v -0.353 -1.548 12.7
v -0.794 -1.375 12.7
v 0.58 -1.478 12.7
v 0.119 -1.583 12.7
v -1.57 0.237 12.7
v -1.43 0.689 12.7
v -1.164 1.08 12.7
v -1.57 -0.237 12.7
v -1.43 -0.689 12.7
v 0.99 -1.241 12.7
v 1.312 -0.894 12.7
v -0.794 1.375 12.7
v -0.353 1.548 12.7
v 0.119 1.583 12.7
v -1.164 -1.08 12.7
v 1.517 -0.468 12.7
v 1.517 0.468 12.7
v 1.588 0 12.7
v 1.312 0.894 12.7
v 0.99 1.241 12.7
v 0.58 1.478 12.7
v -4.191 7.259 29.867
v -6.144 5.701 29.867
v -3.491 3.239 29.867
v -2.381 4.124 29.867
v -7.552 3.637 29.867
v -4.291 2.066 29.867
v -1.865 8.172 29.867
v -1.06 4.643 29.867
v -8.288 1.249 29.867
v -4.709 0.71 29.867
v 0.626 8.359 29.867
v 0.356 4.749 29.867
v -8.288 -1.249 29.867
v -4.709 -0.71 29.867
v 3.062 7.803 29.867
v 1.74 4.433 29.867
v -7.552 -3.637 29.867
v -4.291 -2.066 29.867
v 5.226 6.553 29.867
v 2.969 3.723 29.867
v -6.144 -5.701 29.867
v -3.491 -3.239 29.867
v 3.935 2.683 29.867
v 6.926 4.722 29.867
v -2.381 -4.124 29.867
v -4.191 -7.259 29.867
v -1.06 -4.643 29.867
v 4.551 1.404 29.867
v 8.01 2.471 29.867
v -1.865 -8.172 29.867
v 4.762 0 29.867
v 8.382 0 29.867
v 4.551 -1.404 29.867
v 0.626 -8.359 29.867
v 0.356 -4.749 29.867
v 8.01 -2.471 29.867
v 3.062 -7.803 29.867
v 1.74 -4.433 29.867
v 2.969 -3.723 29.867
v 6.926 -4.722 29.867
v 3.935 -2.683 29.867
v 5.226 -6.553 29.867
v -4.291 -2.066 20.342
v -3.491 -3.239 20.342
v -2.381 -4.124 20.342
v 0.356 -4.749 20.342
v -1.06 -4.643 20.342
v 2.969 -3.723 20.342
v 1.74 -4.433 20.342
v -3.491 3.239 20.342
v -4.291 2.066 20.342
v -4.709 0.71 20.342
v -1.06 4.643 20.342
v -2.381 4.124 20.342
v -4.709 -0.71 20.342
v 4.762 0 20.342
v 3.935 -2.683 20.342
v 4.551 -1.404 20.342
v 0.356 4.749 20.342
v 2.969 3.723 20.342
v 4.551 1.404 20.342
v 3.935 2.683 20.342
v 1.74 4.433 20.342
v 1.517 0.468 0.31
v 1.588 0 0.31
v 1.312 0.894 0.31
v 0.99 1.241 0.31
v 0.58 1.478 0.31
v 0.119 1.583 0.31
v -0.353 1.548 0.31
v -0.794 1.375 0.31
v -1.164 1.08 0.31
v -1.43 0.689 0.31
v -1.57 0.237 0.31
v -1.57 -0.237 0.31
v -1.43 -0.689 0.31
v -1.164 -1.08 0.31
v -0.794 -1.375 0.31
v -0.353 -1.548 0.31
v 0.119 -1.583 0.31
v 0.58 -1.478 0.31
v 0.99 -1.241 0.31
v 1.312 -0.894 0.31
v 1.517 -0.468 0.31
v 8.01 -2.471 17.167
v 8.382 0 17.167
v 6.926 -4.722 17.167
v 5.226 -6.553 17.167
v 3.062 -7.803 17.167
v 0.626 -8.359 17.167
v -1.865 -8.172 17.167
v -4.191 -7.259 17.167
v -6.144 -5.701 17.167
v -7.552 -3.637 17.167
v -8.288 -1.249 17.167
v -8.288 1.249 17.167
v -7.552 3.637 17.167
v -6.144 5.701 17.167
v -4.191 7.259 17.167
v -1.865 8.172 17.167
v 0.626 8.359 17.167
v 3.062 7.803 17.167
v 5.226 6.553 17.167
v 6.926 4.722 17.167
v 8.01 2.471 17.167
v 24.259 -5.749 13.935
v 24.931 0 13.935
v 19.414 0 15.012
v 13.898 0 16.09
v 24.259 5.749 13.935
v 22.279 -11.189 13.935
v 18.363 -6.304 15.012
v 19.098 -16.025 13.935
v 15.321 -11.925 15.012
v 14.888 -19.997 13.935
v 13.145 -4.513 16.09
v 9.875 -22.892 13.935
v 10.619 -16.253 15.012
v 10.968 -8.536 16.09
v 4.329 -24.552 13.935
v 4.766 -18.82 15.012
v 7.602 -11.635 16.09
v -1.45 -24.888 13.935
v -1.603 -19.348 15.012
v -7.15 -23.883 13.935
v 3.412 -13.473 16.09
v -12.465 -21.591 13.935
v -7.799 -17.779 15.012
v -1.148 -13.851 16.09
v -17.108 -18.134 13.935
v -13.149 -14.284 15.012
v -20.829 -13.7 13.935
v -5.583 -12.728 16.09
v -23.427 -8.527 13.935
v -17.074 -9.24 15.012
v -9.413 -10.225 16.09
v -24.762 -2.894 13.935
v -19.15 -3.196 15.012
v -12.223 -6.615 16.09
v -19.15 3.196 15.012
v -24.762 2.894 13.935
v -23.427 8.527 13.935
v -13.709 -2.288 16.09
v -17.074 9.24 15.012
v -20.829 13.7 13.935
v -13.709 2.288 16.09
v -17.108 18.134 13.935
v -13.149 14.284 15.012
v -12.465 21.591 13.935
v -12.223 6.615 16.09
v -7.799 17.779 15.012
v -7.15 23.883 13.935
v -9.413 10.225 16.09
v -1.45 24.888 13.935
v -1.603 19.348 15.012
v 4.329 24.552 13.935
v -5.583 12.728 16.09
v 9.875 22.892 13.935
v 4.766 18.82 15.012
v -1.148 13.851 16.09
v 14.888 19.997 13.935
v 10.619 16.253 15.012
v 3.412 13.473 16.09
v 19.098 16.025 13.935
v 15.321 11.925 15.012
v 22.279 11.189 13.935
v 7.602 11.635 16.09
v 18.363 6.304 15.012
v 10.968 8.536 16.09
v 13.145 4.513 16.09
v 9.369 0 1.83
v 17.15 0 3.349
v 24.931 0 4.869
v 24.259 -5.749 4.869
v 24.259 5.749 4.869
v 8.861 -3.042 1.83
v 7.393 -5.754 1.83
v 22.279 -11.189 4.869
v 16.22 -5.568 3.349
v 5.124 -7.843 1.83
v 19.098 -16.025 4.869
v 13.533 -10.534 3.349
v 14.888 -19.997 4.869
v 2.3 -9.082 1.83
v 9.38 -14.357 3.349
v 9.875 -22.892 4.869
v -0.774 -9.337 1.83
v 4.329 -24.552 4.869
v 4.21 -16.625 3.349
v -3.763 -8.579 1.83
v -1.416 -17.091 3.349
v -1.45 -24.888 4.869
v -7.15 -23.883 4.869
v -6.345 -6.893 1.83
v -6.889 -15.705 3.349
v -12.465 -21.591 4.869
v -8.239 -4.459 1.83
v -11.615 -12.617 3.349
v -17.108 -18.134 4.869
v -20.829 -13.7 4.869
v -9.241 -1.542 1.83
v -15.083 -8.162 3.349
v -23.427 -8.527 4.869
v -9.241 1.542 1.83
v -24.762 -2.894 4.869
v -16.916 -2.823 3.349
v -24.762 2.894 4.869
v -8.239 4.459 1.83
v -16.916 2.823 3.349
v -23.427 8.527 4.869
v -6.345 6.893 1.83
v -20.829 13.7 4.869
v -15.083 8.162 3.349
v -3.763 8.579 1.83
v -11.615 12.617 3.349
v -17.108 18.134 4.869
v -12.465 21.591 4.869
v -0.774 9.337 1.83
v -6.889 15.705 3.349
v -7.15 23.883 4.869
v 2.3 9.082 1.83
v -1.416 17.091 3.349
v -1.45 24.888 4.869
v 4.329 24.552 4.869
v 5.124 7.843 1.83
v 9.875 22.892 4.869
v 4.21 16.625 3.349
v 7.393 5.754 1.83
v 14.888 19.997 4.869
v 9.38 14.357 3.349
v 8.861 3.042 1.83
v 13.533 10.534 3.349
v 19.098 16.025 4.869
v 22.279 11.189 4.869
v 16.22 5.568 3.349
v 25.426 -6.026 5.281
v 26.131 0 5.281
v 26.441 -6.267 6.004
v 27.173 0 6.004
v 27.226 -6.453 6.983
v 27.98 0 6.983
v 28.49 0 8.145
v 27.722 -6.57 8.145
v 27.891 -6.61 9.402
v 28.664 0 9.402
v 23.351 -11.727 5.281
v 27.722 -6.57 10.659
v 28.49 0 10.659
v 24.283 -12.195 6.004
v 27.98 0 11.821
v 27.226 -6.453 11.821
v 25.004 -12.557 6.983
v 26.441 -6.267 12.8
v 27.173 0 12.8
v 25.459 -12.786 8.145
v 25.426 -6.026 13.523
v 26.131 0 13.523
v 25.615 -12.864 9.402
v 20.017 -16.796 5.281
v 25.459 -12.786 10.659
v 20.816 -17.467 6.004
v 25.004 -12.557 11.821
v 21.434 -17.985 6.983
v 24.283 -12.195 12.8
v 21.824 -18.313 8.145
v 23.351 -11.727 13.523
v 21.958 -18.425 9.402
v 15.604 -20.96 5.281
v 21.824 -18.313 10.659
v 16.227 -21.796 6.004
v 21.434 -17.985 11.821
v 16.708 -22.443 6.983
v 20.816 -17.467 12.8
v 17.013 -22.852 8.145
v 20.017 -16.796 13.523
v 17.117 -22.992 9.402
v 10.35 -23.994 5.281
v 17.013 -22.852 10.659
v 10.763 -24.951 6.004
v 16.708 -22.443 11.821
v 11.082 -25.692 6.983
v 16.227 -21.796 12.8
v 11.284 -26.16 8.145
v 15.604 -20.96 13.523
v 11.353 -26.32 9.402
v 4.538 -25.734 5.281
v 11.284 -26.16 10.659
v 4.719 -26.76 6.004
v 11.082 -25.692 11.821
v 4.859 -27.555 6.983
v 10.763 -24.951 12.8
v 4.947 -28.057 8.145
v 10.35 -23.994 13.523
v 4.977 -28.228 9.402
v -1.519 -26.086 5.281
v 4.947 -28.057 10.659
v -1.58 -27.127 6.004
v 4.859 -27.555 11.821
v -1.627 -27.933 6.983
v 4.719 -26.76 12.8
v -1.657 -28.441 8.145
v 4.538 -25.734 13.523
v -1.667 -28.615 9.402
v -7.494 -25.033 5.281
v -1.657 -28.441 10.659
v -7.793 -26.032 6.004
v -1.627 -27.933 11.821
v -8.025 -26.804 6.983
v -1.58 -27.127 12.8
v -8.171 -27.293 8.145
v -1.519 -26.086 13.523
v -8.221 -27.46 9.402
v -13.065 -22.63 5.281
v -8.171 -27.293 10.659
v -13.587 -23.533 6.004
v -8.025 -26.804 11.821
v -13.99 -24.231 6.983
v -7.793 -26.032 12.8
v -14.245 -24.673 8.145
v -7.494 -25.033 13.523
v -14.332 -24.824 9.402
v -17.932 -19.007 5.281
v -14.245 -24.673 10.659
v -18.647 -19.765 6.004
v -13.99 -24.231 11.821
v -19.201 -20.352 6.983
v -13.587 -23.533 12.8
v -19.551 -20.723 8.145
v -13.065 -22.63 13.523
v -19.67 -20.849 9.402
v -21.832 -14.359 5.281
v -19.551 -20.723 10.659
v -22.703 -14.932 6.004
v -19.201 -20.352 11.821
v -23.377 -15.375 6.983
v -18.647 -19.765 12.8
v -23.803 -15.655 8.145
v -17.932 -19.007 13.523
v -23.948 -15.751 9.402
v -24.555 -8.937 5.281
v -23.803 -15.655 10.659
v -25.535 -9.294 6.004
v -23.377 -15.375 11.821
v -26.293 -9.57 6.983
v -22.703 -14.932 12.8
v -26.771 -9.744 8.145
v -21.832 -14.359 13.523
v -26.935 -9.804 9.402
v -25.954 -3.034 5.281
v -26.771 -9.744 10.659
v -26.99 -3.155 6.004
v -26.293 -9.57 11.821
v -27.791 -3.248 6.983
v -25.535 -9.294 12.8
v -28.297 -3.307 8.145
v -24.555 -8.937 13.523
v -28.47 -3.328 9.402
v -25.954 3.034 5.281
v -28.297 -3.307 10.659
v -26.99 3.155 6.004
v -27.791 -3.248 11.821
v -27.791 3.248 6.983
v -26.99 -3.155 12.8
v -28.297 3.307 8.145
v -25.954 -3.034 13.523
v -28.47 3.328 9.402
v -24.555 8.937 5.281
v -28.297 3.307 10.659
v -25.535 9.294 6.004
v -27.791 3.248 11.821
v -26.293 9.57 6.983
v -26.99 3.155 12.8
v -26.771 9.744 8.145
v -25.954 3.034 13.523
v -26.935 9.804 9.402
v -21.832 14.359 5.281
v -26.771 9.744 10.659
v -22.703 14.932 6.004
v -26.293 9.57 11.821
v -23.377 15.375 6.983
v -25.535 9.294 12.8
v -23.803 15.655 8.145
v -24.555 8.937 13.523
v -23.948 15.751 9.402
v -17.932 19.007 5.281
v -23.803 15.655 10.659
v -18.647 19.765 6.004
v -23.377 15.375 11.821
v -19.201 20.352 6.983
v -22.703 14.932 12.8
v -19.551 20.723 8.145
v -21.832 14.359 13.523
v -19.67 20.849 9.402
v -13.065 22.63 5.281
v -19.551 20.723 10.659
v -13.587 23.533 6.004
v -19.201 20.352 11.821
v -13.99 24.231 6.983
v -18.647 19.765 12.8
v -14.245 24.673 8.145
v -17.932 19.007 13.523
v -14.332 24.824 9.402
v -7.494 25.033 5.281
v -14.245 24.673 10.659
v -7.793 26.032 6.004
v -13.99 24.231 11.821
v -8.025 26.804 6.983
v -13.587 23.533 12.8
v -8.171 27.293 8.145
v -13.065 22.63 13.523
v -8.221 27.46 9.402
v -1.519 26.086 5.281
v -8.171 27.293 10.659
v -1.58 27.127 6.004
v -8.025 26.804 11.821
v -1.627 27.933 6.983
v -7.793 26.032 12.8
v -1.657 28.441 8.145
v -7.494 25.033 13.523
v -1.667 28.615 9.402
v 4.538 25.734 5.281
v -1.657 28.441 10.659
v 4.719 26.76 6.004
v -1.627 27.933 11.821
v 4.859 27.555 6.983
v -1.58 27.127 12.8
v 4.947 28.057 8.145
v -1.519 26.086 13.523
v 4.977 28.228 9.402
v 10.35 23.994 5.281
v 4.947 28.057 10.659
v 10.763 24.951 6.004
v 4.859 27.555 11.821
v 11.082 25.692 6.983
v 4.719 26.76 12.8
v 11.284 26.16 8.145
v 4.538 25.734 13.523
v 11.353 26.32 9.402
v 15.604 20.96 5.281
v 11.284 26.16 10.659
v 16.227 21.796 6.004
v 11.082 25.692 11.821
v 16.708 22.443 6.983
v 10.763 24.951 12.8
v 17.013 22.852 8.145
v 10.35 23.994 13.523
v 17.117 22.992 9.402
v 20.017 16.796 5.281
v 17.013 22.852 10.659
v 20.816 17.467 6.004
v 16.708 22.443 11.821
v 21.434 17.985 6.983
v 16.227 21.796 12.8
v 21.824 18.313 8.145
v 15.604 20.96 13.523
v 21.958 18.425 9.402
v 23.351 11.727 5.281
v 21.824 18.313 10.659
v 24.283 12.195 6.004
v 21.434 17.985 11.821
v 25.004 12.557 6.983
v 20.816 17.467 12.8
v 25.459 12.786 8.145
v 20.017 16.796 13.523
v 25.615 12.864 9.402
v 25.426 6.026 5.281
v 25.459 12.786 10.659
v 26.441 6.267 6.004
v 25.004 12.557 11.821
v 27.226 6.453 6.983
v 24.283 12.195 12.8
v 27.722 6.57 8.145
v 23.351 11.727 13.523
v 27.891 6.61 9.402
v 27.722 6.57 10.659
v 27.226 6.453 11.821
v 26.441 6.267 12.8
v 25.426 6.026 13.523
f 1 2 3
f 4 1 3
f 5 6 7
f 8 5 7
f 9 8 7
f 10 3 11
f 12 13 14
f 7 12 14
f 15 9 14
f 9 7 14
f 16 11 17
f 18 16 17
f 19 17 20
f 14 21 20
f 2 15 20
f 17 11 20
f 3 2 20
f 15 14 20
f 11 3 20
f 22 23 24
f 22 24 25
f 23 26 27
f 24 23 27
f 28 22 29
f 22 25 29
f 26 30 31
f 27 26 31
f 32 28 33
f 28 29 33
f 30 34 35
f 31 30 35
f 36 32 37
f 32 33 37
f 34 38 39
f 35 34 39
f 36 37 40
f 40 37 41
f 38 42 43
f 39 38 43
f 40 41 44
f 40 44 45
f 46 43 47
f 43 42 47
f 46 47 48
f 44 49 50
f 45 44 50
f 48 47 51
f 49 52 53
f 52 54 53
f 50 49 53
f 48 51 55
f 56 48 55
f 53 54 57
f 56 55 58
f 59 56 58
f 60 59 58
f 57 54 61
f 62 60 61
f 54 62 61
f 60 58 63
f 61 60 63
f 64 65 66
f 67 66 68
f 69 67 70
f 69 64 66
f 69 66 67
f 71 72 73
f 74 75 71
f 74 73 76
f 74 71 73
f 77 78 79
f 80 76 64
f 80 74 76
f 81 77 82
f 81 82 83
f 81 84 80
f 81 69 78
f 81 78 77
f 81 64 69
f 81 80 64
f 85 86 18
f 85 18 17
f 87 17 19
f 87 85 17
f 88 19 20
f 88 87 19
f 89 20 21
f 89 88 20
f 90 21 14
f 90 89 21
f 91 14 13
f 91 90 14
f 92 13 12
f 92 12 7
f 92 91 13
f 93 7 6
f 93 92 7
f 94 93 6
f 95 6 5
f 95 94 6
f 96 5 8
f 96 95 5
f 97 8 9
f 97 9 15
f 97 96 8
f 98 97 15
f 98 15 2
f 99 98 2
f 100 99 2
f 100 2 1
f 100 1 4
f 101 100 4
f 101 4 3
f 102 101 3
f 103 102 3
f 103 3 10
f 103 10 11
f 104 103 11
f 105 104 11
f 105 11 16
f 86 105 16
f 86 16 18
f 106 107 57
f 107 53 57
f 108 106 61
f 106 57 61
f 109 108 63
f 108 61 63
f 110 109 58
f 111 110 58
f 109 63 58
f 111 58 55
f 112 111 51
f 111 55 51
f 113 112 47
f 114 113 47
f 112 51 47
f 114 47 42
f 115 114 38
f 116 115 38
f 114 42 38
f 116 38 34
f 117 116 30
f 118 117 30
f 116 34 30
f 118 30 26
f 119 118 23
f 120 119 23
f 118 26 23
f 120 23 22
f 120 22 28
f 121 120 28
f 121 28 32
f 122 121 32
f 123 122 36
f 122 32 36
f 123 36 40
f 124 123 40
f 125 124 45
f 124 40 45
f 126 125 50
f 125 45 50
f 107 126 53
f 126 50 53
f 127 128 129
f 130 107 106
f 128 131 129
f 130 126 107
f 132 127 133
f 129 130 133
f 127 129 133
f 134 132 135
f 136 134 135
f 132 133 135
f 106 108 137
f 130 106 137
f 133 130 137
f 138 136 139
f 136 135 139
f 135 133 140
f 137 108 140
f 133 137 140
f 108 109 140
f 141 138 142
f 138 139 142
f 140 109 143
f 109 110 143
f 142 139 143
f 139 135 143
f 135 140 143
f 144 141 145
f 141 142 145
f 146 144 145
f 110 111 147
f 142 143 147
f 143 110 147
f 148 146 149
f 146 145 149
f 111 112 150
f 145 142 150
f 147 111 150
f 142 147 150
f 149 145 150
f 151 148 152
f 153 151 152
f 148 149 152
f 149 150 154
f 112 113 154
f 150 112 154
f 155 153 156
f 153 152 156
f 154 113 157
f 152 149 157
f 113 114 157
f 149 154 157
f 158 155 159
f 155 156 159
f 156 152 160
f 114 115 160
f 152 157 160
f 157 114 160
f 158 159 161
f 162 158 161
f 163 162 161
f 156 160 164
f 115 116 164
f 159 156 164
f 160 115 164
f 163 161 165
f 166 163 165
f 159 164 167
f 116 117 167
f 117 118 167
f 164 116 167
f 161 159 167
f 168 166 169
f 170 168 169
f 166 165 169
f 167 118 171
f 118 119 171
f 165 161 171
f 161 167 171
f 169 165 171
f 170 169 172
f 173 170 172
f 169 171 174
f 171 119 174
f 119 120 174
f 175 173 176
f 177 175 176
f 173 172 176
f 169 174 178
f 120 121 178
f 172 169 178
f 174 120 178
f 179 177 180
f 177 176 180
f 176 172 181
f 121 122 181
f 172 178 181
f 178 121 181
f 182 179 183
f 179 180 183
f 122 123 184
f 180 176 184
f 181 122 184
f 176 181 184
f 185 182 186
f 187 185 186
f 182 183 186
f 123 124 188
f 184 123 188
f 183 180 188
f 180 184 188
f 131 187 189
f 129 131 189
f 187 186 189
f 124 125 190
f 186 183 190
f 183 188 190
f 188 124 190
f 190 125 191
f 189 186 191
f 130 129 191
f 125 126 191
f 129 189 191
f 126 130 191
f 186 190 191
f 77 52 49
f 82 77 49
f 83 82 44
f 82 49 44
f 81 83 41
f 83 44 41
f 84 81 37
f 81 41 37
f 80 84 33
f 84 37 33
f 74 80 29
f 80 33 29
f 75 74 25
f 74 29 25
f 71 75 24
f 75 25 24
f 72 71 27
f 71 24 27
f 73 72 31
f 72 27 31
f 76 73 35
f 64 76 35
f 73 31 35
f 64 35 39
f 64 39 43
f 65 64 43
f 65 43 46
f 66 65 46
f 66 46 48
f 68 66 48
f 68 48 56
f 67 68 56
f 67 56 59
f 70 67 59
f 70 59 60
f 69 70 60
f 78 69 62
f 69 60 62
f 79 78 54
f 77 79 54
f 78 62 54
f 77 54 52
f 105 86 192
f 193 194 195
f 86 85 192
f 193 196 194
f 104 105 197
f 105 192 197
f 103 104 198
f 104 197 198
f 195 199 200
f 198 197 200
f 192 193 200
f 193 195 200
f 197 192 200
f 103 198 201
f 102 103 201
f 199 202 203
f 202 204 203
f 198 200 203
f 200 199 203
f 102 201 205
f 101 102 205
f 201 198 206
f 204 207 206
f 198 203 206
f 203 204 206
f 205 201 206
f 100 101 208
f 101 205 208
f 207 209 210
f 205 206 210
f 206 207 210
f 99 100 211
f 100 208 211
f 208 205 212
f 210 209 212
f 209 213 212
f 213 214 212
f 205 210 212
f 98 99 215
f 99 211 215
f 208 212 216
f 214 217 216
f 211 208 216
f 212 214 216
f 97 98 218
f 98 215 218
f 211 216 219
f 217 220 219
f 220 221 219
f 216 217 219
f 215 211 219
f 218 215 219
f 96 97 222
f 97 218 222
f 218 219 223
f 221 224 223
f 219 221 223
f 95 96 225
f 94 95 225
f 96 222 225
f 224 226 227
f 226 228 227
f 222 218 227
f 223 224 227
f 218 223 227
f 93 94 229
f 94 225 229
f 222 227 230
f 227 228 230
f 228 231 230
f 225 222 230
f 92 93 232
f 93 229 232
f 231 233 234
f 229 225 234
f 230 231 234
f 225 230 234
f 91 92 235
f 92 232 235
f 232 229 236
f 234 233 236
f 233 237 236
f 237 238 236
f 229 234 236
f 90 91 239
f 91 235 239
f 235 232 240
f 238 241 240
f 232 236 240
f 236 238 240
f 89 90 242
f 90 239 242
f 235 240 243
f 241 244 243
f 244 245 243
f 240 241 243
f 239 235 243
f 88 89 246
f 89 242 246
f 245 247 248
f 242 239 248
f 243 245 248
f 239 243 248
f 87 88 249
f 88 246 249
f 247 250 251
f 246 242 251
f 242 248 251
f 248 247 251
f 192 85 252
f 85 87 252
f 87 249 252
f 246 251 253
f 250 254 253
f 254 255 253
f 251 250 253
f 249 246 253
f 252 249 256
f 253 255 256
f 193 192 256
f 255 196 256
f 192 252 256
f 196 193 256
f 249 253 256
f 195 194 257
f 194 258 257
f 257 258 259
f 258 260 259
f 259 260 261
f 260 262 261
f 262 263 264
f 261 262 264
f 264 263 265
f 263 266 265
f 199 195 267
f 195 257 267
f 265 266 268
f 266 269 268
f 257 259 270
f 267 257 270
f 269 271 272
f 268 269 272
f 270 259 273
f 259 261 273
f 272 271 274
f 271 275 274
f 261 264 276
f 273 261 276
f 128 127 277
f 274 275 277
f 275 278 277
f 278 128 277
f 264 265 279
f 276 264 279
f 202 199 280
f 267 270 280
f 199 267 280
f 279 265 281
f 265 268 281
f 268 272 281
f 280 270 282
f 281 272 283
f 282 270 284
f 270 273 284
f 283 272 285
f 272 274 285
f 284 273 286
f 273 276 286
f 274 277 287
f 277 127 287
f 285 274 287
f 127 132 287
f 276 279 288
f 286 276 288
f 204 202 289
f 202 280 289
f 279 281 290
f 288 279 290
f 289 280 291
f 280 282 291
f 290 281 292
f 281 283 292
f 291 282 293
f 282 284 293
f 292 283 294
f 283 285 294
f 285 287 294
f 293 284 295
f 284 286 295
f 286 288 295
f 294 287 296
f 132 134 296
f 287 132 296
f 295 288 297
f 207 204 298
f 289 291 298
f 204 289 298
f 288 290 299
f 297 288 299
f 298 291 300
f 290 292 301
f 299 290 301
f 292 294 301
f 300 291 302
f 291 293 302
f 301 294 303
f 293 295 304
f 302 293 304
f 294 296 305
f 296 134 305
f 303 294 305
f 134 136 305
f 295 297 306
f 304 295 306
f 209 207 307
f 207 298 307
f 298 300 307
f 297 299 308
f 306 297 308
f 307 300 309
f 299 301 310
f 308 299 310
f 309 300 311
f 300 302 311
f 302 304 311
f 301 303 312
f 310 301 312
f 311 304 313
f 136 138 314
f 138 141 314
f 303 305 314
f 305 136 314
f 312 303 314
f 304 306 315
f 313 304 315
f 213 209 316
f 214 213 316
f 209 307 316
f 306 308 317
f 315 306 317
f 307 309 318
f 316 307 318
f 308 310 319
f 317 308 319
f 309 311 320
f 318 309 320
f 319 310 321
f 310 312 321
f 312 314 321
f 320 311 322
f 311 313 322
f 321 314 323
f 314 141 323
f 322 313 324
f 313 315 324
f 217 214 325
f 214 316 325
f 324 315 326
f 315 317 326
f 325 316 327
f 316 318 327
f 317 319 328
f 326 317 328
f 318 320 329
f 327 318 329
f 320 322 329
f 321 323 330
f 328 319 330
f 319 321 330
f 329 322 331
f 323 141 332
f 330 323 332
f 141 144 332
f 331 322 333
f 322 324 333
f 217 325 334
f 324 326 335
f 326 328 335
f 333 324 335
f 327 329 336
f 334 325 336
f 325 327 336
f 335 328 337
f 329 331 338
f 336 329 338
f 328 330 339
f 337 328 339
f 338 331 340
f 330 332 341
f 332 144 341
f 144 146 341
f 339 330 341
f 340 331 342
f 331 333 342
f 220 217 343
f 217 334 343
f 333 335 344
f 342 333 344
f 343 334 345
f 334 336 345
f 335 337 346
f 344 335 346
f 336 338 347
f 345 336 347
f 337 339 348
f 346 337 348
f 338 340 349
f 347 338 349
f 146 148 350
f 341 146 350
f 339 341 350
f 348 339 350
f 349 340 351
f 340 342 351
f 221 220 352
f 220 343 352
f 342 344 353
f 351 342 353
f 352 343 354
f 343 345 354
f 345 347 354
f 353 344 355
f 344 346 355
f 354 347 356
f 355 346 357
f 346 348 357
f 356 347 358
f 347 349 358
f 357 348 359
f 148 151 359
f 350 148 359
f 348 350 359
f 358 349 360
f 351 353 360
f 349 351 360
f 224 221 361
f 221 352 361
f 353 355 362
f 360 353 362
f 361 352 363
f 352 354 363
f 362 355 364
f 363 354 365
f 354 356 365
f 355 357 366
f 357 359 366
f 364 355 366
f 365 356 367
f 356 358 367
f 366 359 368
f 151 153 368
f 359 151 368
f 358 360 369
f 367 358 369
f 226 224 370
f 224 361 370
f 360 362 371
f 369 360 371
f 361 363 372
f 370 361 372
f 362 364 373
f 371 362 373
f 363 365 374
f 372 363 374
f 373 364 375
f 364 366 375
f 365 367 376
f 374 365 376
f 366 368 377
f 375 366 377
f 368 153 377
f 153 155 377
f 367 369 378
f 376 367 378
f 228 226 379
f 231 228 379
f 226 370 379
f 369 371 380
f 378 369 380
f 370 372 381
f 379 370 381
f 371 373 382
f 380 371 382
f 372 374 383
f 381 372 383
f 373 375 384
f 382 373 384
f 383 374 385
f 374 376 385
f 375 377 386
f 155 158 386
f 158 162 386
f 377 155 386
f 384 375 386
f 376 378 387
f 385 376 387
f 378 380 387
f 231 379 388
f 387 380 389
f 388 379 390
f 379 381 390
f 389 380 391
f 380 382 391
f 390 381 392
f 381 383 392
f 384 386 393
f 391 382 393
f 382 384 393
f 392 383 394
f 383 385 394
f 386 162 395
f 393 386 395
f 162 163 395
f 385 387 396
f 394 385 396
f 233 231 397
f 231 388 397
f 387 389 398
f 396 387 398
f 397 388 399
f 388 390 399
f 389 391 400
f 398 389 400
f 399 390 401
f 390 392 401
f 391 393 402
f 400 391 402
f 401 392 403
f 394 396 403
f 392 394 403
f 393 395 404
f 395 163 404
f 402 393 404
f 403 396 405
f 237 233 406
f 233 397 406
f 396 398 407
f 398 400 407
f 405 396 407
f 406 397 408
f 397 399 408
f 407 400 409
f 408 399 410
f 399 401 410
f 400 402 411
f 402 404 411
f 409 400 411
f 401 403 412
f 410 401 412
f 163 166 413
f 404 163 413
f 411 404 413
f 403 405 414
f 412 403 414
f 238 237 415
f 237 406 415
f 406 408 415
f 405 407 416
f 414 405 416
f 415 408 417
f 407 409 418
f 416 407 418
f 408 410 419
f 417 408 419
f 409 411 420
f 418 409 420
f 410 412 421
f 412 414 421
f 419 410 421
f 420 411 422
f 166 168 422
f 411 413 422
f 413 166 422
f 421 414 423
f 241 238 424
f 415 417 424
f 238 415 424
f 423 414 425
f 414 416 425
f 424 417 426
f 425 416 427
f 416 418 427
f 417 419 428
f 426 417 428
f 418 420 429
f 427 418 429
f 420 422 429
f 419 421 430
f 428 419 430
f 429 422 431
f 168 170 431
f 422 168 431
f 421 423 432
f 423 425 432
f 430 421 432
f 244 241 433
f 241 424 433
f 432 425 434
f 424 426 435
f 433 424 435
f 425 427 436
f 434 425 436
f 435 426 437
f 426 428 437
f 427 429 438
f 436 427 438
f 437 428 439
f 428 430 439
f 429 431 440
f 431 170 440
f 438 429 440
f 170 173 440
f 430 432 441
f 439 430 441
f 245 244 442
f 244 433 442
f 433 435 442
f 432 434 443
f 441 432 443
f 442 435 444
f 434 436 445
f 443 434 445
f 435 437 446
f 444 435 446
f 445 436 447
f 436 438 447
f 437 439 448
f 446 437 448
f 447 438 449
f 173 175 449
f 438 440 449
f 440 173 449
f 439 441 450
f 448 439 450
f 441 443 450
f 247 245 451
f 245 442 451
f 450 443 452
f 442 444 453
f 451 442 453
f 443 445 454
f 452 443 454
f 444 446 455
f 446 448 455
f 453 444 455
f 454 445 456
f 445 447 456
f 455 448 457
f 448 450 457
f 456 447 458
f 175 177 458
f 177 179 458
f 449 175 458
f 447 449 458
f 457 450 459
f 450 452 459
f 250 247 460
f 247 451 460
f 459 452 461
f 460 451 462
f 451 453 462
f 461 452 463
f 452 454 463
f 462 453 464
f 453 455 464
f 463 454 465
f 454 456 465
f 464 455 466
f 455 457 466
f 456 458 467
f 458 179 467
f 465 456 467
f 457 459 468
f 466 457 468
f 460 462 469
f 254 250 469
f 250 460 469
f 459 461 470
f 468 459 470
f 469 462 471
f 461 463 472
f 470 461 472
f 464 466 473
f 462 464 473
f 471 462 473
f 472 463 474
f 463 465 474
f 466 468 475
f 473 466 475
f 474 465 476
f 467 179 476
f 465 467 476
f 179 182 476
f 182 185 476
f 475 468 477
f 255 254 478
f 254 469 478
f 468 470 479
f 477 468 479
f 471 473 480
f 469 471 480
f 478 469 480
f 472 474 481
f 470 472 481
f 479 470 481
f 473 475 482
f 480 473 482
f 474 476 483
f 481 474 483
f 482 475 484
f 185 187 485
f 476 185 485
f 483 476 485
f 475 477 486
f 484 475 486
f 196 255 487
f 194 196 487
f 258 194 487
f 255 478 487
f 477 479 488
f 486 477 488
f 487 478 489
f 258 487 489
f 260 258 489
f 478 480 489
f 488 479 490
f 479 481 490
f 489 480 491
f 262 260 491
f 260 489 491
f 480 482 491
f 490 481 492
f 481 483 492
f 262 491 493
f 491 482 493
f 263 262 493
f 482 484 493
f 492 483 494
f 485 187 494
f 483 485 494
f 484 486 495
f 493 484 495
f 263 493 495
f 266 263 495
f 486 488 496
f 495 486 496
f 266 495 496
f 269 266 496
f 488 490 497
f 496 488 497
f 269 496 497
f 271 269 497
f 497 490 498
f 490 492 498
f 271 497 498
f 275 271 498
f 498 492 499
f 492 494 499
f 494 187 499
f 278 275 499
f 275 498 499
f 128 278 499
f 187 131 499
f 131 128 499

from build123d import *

# Parameters (mm, degrees)
F2_R     = 4.7625
F3_DEPTH = 9.525
F4_R     = 1.5875
F5_DEPTH = 12.7


with BuildPart() as f1:
    # F0 (on Front) → F1 (revolve)
    with BuildSketch(Plane.XZ):
        with BuildLine():
            Line((0, 29.8668724909), (0, 0))
            Line((0, 0), (24.9306534148, 4.8691192822))
            ThreePointArc((24.9306534148, 4.8691192822), (28.6638483422, 9.4019658913), (24.9306534148, 13.9348125005))
            Line((24.9306534148, 13.9348125005), (8.382, 17.1668724909))
            Line((8.382, 17.1668724909), (8.382, 29.8668724909))
            Line((8.382, 29.8668724909), (0, 29.8668724909))
        make_face()
    revolve(axis=Axis((0, 0, 14.9334362454), (0, 0, -1)))

    # F2 (on face) → F3 (cut)
    with BuildSketch(Plane.XY.offset(29.8668724909)):
        Circle(F2_R)
    extrude(amount=-F3_DEPTH, mode=Mode.SUBTRACT)

    # F4 (on Top) → F5 (cut)
    with BuildSketch(Plane.XY):
        Circle(F4_R)
    extrude(amount=F5_DEPTH, mode=Mode.SUBTRACT)


solid = f1.part
